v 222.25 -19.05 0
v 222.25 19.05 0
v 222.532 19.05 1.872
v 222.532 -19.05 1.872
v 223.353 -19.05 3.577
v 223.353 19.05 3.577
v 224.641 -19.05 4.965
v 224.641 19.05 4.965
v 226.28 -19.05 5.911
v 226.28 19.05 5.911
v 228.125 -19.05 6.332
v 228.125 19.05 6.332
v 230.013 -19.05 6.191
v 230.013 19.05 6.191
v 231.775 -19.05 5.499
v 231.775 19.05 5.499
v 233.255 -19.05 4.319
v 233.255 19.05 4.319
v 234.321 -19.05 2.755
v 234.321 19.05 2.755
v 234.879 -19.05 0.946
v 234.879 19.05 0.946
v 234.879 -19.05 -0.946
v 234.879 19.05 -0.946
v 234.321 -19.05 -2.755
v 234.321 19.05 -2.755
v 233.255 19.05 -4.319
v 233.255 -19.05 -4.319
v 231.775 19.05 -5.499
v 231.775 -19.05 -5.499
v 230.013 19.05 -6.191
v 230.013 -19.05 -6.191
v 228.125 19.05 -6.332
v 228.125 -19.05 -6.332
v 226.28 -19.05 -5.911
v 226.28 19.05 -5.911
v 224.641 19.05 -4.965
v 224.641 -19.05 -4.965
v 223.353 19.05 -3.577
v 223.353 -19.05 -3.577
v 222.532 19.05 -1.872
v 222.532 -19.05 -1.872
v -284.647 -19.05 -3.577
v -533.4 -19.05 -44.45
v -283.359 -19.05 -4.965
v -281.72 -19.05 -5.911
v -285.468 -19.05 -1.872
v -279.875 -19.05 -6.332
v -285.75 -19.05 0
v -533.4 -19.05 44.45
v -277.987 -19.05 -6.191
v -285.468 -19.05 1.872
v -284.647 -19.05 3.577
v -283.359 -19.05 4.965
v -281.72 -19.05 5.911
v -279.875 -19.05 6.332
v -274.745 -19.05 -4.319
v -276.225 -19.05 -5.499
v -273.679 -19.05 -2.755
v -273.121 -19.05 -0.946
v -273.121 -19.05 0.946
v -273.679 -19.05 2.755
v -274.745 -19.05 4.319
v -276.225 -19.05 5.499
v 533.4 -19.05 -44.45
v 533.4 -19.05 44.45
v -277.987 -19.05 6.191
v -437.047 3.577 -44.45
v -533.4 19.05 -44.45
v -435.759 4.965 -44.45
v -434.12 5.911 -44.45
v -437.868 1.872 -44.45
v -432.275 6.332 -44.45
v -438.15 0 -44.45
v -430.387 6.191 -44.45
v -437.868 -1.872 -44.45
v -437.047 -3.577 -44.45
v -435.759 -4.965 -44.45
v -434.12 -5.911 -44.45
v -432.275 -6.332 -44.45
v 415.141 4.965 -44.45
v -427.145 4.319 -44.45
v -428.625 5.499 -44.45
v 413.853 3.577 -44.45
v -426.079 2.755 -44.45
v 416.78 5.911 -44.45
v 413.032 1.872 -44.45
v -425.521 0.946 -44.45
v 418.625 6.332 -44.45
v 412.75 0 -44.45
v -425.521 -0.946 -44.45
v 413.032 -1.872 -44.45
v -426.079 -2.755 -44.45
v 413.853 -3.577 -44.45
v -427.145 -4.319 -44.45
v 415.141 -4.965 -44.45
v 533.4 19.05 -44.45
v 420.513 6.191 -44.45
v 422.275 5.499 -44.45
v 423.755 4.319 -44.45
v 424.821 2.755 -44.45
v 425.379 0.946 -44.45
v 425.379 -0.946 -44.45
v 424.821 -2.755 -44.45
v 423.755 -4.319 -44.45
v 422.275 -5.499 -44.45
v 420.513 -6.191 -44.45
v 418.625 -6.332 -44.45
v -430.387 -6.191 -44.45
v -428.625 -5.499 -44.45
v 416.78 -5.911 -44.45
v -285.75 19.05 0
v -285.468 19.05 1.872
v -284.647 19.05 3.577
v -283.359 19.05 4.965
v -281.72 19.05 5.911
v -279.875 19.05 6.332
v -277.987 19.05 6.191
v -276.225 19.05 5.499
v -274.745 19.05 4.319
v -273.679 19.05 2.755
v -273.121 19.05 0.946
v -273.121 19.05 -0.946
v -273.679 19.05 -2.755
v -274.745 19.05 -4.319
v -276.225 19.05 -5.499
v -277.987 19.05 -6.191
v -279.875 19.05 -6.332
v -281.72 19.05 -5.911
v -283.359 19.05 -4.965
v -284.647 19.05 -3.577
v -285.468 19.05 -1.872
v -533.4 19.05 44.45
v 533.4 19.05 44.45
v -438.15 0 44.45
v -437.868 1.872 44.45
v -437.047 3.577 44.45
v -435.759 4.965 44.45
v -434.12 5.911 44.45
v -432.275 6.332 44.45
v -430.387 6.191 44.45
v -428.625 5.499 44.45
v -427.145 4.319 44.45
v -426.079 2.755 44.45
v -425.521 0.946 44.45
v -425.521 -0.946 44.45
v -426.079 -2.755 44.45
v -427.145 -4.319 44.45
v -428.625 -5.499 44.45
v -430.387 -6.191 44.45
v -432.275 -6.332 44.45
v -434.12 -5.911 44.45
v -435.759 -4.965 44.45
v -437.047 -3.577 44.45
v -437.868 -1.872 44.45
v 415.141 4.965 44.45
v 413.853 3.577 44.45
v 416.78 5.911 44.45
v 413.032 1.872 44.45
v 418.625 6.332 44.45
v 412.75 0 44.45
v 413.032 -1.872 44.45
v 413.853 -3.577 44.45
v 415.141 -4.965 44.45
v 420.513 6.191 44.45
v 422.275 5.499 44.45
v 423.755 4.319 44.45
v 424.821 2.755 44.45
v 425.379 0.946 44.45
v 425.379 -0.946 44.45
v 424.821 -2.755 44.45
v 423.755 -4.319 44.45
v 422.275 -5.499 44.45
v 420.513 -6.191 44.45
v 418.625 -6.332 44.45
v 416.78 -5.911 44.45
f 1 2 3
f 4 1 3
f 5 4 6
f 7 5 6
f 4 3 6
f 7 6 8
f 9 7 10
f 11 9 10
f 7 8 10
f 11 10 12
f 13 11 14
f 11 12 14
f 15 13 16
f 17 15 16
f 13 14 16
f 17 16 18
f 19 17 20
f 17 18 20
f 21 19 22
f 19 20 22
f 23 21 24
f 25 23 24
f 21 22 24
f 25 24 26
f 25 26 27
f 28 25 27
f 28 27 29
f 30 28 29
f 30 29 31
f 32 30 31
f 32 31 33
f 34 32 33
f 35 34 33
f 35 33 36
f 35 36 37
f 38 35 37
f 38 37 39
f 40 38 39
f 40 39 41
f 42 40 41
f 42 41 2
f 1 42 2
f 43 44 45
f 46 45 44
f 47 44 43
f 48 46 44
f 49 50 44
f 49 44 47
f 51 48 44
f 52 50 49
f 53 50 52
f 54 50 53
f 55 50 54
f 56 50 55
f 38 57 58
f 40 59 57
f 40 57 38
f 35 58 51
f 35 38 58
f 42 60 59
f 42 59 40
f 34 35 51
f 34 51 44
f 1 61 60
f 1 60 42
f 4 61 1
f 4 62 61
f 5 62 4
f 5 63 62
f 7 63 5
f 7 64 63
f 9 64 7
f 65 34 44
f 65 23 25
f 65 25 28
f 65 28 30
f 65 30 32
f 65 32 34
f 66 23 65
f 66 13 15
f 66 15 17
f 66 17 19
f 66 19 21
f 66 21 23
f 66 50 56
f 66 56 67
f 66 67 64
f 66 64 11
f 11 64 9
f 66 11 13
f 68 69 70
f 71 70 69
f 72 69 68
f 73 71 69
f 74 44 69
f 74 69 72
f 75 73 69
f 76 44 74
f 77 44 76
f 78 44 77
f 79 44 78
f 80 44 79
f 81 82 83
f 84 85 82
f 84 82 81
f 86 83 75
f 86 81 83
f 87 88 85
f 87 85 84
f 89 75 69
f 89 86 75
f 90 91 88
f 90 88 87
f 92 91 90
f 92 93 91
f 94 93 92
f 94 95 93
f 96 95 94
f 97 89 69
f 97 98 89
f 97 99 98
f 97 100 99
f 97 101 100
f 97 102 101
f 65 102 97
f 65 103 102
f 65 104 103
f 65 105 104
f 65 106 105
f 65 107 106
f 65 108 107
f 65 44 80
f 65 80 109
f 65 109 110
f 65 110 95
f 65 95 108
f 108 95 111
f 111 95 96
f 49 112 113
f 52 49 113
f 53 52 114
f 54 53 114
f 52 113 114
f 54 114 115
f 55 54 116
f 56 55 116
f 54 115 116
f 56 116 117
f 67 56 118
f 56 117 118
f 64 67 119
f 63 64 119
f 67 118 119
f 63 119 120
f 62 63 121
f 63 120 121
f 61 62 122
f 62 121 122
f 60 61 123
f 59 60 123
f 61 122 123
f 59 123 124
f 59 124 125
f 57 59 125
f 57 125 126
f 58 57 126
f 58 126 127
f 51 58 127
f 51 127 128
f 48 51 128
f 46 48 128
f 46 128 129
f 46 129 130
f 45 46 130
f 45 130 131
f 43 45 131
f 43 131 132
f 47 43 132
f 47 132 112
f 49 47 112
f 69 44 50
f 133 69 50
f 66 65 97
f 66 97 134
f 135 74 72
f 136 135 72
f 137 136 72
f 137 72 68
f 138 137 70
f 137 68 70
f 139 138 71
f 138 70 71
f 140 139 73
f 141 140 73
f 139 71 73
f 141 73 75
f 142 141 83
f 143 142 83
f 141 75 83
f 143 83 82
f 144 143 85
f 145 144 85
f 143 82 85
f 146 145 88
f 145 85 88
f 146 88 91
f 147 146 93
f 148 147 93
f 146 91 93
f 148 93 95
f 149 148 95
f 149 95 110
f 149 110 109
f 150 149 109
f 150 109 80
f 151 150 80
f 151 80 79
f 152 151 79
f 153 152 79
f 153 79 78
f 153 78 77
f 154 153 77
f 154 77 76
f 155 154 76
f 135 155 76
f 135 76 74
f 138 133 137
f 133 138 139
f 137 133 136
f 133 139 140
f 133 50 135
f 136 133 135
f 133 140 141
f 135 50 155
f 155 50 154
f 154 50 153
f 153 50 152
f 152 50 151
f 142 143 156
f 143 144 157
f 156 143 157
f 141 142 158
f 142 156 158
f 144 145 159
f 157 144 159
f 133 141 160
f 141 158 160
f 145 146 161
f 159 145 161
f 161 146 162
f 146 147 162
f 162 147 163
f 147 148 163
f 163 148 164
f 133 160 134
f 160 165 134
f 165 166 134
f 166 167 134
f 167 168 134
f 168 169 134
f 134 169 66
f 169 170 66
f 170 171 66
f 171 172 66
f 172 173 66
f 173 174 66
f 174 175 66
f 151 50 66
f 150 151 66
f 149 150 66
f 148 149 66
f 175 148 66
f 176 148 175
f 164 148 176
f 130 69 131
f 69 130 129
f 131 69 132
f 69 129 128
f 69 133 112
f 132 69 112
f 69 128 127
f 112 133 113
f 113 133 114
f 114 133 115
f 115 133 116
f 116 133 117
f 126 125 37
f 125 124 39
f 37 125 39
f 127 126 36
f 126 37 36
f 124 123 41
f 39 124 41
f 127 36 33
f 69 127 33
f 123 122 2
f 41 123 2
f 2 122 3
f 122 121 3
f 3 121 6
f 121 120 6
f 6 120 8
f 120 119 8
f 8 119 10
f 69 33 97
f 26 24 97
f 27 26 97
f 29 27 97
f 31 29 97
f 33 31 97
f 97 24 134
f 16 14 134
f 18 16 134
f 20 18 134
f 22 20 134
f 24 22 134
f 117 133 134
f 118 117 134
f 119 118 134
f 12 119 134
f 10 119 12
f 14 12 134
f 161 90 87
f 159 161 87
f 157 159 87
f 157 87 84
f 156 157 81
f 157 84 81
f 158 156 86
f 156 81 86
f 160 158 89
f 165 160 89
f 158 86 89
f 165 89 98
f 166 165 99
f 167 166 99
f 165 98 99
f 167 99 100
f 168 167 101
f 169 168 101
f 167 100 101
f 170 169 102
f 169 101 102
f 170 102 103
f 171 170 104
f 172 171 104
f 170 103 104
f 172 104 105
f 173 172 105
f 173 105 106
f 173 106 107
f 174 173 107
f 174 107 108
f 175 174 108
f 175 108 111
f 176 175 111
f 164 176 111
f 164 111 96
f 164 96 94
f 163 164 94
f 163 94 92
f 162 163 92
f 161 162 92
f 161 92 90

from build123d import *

# Parameters (mm, degrees)
F0_W        = 1066.8
F0_H        = 88.9
F1_DEPTH    = 19.05
F3_W        = 381
F3_H        = 88.9
F4_DEPTH    = 19.05
F10_D       = 12.7
F10_DEPTH   = 609.6
F11_D       = 12.7
F11_DEPTH   = 609.6
F13_D       = 12.7
F13_DEPTH   = 609.6
F13_2_D     = 12.7
F13_2_DEPTH = 609.6
F16_D       = 12.7
F16_DEPTH   = 609.6
F18_D       = 12.7
F18_DEPTH   = 609.6


with BuildPart() as f1:
    # F0 (on Front) → F1 (new body, symmetric)
    with BuildSketch(Plane.XZ):
        Rectangle(F0_W, F0_H)
    extrude(amount=F1_DEPTH, both=True)

    # F3 (on Front) → F4 (join, symmetric)
    with BuildSketch(Plane.XZ):
        Rectangle(F3_W, F3_H)
    extrude(amount=F4_DEPTH, both=True)

    # F11
    with Locations(Plane.XY.offset(152.4)):
        with Locations((419.1, 0)):
            Hole(F11_D / 2, depth=F11_DEPTH)

    # F13
    with Locations(Plane.XZ.offset(91.44)):
        with Locations((-279.4, 0)):
            Hole(F13_D / 2, depth=F13_DEPTH)

    # F16
    with Locations(Plane.XY.offset(152.4)):
        with Locations((-431.8, 0)):
            Hole(F16_D / 2, depth=F16_DEPTH)

    # F18
    with Locations(Plane.XZ.offset(19.05)):
        with Locations((228.6, 0)):
            Hole(F18_D / 2, depth=F18_DEPTH)


with BuildPart() as f2_1:
    # F2: copy of F1
    add(f1.part.moved(Location((0, 114.3, 0))))


with BuildPart() as f6_1:
    # F6: copy of F1
    add(f1.part.moved(Location((0, 152.4, 0))))

    # F10
    with Locations(Plane.XY.offset(152.4)):
        with Locations((419.1, 152.4)):
            Hole(F10_D / 2, depth=F10_DEPTH)

    # F13#2
    with Locations(Plane.XZ.offset(91.44)):
        with Locations((-279.4, 0)):
            Hole(F13_2_D / 2, depth=F13_2_DEPTH)


solid = f1.part
